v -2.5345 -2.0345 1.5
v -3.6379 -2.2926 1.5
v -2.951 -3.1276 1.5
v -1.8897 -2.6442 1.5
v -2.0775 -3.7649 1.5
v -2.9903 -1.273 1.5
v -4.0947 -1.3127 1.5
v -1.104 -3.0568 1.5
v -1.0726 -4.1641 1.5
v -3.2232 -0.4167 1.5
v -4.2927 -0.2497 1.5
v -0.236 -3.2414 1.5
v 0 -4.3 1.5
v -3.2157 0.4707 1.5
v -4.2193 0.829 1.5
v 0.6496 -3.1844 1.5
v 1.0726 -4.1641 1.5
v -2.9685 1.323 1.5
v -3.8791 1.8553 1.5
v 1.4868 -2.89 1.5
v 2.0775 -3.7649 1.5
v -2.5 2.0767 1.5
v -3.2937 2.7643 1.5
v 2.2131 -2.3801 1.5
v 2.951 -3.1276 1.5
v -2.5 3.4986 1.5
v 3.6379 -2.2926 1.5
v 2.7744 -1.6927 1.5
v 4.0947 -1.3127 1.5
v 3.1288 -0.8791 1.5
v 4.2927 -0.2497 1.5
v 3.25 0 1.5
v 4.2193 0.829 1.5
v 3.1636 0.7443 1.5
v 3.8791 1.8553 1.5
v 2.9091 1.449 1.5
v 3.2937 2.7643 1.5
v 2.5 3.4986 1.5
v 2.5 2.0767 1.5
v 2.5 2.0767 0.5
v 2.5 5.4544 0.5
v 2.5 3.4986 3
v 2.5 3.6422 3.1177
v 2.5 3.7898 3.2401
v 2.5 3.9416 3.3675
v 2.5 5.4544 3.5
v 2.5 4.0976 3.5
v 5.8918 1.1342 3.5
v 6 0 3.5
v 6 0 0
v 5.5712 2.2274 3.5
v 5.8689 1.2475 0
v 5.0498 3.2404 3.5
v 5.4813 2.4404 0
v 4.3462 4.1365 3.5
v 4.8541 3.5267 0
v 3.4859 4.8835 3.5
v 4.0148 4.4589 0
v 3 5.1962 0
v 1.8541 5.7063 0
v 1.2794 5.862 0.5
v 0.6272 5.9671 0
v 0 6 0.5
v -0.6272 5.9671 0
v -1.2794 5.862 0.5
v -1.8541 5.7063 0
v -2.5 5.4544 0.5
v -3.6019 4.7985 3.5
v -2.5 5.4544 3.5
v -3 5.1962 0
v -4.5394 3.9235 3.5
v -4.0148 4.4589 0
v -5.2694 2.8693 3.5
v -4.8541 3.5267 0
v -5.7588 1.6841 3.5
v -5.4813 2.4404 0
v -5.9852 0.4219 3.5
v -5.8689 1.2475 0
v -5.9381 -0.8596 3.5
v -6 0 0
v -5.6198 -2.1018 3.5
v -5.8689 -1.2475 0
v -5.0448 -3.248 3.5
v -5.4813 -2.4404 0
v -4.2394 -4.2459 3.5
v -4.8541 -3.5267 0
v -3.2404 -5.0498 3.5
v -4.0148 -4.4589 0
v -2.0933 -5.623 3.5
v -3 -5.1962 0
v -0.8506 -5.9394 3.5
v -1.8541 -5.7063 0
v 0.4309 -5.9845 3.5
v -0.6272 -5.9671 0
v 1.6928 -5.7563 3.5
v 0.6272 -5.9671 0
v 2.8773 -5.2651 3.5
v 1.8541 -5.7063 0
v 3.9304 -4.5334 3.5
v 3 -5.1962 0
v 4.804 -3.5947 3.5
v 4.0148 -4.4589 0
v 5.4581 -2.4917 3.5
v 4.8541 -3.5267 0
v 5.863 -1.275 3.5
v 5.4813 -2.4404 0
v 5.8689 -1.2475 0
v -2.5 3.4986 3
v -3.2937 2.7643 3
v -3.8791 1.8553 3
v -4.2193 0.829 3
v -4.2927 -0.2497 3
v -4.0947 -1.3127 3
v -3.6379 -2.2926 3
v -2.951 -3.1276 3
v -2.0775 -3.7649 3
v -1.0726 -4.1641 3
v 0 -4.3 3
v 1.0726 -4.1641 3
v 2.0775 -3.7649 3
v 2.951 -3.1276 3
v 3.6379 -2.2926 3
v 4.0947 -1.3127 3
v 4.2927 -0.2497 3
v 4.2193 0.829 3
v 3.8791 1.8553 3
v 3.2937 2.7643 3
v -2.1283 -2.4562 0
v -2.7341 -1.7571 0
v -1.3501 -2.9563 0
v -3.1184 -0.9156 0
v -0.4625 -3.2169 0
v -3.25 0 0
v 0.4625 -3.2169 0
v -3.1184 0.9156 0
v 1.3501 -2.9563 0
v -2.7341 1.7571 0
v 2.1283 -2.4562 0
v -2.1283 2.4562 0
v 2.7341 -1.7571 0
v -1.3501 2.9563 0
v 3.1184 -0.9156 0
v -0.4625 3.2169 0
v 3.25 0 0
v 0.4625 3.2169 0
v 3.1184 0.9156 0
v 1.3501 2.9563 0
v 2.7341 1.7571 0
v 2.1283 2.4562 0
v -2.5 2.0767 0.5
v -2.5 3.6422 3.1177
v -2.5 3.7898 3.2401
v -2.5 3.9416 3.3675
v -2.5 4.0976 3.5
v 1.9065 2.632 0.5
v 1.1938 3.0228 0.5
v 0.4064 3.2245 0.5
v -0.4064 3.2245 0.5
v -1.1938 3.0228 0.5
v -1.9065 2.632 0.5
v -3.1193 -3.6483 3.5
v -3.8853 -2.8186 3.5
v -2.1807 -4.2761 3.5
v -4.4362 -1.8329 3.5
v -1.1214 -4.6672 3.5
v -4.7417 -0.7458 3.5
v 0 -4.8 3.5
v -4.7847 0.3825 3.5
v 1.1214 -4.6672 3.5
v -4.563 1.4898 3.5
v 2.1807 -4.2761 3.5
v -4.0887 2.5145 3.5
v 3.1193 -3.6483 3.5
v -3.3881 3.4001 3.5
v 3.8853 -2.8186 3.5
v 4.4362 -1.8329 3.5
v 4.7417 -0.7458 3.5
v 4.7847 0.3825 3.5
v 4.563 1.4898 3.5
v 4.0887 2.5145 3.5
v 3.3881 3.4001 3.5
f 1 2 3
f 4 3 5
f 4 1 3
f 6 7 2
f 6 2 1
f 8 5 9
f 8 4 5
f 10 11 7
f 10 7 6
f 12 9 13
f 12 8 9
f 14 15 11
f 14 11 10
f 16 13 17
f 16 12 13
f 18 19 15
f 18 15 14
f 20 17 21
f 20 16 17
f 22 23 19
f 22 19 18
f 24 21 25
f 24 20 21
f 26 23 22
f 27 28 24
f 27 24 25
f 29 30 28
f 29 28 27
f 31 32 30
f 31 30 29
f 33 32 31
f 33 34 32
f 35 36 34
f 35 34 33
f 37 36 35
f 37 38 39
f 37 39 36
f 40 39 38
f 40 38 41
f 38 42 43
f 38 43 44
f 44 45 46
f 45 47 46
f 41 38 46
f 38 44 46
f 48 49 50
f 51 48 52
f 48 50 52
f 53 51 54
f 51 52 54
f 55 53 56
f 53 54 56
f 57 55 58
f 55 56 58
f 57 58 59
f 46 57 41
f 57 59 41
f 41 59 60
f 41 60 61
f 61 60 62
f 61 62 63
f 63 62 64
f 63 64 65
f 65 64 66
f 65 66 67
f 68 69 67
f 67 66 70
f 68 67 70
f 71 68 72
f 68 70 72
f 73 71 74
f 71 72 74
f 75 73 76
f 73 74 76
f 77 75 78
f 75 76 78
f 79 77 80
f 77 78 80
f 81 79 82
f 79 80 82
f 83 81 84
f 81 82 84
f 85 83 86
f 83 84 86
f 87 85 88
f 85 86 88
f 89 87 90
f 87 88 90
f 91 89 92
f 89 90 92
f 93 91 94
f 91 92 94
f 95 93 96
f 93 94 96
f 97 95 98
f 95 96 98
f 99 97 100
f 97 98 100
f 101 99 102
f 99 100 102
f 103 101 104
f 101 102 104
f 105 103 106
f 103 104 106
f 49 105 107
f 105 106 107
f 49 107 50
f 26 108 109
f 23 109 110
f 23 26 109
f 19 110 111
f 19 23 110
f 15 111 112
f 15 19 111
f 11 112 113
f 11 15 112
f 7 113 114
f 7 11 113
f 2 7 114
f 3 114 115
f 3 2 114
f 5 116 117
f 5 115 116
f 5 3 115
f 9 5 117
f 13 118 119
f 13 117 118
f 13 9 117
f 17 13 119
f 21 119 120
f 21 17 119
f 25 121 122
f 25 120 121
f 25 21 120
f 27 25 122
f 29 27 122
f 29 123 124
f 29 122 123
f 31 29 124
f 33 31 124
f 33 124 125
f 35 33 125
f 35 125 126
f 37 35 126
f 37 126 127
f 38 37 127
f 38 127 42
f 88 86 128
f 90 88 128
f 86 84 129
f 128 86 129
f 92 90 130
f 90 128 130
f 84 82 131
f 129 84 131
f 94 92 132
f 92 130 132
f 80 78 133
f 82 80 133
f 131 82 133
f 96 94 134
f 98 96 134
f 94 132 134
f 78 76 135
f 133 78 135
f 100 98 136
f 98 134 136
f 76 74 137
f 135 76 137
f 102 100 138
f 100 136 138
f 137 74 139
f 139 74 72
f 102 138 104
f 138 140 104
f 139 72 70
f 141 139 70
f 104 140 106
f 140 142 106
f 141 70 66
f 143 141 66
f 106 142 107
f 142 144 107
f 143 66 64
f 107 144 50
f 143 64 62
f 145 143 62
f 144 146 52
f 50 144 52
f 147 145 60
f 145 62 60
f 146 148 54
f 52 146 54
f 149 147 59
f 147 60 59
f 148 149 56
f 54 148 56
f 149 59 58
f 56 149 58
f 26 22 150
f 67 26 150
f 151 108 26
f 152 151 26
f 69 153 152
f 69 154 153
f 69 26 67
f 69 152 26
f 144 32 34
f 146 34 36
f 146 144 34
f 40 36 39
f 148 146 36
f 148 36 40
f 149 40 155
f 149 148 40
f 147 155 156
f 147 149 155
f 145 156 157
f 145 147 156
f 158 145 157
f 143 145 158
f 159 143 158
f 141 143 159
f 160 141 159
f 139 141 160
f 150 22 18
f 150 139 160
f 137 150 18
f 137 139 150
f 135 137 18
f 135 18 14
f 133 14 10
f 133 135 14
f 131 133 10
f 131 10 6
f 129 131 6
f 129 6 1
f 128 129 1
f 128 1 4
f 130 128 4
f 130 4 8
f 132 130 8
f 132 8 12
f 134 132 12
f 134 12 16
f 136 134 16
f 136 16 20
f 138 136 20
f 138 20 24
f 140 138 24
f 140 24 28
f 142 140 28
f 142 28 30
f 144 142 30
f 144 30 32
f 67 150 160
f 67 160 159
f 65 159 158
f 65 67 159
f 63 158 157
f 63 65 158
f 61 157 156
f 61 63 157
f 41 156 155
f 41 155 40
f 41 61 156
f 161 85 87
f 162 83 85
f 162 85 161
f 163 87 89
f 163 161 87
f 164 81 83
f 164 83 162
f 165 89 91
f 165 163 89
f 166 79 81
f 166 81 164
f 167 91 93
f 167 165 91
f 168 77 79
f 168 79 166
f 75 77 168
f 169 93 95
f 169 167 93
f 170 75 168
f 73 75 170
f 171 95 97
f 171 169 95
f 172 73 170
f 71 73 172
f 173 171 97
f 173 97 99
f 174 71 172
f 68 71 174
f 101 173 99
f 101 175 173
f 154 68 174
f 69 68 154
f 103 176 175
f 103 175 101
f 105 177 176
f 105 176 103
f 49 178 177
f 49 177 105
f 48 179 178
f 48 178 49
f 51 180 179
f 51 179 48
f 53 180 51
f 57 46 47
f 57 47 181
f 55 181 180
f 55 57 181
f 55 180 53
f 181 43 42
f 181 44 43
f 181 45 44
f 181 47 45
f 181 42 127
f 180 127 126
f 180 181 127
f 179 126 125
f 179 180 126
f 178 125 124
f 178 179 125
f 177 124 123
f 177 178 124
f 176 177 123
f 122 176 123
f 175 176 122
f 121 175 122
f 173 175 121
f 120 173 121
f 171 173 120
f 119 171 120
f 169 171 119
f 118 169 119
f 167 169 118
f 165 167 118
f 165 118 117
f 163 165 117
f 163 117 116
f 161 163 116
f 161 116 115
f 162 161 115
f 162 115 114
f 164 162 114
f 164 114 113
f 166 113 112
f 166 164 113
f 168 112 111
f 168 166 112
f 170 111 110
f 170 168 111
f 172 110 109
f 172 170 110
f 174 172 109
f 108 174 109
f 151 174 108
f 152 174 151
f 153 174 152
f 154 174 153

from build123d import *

# Parameters (mm, degrees)
F0_R     = 6
F0_R_2   = 3.25
F1_DEPTH = 1.5
F2_R     = 6
F2_R_2   = 4.3
F3_DEPTH = 2
F4_W     = 5
F4_H     = 3.923344
F5_DEPTH = 3
F6_SIZE  = 0.5


with BuildPart() as f1:
    # F0 (on Top) → F1 (new body)
    with BuildSketch(Plane.XY):
        Circle(F0_R)
        Circle(F0_R_2, mode=Mode.SUBTRACT)
    extrude(amount=F1_DEPTH)

    # F2 (on face) → F3 (join)
    with BuildSketch(Plane.XY.offset(1.5)):
        Circle(F2_R)
        Circle(F2_R_2, mode=Mode.SUBTRACT)
    extrude(amount=F3_DEPTH)

    # F4 (on face) → F5 (cut)
    with BuildSketch(Plane.XY.offset(3.5)):
        with Locations((0, 4.038328)):
            Rectangle(F4_W, F4_H)
    extrude(amount=-F5_DEPTH, mode=Mode.SUBTRACT)

    # F6
    f6_edges = [f1.edges().sort_by_distance(p)[0] for p in [
        (0, -4.3, 3.5),
    ]]
    chamfer(f6_edges, length=F6_SIZE)


solid = f1.part
